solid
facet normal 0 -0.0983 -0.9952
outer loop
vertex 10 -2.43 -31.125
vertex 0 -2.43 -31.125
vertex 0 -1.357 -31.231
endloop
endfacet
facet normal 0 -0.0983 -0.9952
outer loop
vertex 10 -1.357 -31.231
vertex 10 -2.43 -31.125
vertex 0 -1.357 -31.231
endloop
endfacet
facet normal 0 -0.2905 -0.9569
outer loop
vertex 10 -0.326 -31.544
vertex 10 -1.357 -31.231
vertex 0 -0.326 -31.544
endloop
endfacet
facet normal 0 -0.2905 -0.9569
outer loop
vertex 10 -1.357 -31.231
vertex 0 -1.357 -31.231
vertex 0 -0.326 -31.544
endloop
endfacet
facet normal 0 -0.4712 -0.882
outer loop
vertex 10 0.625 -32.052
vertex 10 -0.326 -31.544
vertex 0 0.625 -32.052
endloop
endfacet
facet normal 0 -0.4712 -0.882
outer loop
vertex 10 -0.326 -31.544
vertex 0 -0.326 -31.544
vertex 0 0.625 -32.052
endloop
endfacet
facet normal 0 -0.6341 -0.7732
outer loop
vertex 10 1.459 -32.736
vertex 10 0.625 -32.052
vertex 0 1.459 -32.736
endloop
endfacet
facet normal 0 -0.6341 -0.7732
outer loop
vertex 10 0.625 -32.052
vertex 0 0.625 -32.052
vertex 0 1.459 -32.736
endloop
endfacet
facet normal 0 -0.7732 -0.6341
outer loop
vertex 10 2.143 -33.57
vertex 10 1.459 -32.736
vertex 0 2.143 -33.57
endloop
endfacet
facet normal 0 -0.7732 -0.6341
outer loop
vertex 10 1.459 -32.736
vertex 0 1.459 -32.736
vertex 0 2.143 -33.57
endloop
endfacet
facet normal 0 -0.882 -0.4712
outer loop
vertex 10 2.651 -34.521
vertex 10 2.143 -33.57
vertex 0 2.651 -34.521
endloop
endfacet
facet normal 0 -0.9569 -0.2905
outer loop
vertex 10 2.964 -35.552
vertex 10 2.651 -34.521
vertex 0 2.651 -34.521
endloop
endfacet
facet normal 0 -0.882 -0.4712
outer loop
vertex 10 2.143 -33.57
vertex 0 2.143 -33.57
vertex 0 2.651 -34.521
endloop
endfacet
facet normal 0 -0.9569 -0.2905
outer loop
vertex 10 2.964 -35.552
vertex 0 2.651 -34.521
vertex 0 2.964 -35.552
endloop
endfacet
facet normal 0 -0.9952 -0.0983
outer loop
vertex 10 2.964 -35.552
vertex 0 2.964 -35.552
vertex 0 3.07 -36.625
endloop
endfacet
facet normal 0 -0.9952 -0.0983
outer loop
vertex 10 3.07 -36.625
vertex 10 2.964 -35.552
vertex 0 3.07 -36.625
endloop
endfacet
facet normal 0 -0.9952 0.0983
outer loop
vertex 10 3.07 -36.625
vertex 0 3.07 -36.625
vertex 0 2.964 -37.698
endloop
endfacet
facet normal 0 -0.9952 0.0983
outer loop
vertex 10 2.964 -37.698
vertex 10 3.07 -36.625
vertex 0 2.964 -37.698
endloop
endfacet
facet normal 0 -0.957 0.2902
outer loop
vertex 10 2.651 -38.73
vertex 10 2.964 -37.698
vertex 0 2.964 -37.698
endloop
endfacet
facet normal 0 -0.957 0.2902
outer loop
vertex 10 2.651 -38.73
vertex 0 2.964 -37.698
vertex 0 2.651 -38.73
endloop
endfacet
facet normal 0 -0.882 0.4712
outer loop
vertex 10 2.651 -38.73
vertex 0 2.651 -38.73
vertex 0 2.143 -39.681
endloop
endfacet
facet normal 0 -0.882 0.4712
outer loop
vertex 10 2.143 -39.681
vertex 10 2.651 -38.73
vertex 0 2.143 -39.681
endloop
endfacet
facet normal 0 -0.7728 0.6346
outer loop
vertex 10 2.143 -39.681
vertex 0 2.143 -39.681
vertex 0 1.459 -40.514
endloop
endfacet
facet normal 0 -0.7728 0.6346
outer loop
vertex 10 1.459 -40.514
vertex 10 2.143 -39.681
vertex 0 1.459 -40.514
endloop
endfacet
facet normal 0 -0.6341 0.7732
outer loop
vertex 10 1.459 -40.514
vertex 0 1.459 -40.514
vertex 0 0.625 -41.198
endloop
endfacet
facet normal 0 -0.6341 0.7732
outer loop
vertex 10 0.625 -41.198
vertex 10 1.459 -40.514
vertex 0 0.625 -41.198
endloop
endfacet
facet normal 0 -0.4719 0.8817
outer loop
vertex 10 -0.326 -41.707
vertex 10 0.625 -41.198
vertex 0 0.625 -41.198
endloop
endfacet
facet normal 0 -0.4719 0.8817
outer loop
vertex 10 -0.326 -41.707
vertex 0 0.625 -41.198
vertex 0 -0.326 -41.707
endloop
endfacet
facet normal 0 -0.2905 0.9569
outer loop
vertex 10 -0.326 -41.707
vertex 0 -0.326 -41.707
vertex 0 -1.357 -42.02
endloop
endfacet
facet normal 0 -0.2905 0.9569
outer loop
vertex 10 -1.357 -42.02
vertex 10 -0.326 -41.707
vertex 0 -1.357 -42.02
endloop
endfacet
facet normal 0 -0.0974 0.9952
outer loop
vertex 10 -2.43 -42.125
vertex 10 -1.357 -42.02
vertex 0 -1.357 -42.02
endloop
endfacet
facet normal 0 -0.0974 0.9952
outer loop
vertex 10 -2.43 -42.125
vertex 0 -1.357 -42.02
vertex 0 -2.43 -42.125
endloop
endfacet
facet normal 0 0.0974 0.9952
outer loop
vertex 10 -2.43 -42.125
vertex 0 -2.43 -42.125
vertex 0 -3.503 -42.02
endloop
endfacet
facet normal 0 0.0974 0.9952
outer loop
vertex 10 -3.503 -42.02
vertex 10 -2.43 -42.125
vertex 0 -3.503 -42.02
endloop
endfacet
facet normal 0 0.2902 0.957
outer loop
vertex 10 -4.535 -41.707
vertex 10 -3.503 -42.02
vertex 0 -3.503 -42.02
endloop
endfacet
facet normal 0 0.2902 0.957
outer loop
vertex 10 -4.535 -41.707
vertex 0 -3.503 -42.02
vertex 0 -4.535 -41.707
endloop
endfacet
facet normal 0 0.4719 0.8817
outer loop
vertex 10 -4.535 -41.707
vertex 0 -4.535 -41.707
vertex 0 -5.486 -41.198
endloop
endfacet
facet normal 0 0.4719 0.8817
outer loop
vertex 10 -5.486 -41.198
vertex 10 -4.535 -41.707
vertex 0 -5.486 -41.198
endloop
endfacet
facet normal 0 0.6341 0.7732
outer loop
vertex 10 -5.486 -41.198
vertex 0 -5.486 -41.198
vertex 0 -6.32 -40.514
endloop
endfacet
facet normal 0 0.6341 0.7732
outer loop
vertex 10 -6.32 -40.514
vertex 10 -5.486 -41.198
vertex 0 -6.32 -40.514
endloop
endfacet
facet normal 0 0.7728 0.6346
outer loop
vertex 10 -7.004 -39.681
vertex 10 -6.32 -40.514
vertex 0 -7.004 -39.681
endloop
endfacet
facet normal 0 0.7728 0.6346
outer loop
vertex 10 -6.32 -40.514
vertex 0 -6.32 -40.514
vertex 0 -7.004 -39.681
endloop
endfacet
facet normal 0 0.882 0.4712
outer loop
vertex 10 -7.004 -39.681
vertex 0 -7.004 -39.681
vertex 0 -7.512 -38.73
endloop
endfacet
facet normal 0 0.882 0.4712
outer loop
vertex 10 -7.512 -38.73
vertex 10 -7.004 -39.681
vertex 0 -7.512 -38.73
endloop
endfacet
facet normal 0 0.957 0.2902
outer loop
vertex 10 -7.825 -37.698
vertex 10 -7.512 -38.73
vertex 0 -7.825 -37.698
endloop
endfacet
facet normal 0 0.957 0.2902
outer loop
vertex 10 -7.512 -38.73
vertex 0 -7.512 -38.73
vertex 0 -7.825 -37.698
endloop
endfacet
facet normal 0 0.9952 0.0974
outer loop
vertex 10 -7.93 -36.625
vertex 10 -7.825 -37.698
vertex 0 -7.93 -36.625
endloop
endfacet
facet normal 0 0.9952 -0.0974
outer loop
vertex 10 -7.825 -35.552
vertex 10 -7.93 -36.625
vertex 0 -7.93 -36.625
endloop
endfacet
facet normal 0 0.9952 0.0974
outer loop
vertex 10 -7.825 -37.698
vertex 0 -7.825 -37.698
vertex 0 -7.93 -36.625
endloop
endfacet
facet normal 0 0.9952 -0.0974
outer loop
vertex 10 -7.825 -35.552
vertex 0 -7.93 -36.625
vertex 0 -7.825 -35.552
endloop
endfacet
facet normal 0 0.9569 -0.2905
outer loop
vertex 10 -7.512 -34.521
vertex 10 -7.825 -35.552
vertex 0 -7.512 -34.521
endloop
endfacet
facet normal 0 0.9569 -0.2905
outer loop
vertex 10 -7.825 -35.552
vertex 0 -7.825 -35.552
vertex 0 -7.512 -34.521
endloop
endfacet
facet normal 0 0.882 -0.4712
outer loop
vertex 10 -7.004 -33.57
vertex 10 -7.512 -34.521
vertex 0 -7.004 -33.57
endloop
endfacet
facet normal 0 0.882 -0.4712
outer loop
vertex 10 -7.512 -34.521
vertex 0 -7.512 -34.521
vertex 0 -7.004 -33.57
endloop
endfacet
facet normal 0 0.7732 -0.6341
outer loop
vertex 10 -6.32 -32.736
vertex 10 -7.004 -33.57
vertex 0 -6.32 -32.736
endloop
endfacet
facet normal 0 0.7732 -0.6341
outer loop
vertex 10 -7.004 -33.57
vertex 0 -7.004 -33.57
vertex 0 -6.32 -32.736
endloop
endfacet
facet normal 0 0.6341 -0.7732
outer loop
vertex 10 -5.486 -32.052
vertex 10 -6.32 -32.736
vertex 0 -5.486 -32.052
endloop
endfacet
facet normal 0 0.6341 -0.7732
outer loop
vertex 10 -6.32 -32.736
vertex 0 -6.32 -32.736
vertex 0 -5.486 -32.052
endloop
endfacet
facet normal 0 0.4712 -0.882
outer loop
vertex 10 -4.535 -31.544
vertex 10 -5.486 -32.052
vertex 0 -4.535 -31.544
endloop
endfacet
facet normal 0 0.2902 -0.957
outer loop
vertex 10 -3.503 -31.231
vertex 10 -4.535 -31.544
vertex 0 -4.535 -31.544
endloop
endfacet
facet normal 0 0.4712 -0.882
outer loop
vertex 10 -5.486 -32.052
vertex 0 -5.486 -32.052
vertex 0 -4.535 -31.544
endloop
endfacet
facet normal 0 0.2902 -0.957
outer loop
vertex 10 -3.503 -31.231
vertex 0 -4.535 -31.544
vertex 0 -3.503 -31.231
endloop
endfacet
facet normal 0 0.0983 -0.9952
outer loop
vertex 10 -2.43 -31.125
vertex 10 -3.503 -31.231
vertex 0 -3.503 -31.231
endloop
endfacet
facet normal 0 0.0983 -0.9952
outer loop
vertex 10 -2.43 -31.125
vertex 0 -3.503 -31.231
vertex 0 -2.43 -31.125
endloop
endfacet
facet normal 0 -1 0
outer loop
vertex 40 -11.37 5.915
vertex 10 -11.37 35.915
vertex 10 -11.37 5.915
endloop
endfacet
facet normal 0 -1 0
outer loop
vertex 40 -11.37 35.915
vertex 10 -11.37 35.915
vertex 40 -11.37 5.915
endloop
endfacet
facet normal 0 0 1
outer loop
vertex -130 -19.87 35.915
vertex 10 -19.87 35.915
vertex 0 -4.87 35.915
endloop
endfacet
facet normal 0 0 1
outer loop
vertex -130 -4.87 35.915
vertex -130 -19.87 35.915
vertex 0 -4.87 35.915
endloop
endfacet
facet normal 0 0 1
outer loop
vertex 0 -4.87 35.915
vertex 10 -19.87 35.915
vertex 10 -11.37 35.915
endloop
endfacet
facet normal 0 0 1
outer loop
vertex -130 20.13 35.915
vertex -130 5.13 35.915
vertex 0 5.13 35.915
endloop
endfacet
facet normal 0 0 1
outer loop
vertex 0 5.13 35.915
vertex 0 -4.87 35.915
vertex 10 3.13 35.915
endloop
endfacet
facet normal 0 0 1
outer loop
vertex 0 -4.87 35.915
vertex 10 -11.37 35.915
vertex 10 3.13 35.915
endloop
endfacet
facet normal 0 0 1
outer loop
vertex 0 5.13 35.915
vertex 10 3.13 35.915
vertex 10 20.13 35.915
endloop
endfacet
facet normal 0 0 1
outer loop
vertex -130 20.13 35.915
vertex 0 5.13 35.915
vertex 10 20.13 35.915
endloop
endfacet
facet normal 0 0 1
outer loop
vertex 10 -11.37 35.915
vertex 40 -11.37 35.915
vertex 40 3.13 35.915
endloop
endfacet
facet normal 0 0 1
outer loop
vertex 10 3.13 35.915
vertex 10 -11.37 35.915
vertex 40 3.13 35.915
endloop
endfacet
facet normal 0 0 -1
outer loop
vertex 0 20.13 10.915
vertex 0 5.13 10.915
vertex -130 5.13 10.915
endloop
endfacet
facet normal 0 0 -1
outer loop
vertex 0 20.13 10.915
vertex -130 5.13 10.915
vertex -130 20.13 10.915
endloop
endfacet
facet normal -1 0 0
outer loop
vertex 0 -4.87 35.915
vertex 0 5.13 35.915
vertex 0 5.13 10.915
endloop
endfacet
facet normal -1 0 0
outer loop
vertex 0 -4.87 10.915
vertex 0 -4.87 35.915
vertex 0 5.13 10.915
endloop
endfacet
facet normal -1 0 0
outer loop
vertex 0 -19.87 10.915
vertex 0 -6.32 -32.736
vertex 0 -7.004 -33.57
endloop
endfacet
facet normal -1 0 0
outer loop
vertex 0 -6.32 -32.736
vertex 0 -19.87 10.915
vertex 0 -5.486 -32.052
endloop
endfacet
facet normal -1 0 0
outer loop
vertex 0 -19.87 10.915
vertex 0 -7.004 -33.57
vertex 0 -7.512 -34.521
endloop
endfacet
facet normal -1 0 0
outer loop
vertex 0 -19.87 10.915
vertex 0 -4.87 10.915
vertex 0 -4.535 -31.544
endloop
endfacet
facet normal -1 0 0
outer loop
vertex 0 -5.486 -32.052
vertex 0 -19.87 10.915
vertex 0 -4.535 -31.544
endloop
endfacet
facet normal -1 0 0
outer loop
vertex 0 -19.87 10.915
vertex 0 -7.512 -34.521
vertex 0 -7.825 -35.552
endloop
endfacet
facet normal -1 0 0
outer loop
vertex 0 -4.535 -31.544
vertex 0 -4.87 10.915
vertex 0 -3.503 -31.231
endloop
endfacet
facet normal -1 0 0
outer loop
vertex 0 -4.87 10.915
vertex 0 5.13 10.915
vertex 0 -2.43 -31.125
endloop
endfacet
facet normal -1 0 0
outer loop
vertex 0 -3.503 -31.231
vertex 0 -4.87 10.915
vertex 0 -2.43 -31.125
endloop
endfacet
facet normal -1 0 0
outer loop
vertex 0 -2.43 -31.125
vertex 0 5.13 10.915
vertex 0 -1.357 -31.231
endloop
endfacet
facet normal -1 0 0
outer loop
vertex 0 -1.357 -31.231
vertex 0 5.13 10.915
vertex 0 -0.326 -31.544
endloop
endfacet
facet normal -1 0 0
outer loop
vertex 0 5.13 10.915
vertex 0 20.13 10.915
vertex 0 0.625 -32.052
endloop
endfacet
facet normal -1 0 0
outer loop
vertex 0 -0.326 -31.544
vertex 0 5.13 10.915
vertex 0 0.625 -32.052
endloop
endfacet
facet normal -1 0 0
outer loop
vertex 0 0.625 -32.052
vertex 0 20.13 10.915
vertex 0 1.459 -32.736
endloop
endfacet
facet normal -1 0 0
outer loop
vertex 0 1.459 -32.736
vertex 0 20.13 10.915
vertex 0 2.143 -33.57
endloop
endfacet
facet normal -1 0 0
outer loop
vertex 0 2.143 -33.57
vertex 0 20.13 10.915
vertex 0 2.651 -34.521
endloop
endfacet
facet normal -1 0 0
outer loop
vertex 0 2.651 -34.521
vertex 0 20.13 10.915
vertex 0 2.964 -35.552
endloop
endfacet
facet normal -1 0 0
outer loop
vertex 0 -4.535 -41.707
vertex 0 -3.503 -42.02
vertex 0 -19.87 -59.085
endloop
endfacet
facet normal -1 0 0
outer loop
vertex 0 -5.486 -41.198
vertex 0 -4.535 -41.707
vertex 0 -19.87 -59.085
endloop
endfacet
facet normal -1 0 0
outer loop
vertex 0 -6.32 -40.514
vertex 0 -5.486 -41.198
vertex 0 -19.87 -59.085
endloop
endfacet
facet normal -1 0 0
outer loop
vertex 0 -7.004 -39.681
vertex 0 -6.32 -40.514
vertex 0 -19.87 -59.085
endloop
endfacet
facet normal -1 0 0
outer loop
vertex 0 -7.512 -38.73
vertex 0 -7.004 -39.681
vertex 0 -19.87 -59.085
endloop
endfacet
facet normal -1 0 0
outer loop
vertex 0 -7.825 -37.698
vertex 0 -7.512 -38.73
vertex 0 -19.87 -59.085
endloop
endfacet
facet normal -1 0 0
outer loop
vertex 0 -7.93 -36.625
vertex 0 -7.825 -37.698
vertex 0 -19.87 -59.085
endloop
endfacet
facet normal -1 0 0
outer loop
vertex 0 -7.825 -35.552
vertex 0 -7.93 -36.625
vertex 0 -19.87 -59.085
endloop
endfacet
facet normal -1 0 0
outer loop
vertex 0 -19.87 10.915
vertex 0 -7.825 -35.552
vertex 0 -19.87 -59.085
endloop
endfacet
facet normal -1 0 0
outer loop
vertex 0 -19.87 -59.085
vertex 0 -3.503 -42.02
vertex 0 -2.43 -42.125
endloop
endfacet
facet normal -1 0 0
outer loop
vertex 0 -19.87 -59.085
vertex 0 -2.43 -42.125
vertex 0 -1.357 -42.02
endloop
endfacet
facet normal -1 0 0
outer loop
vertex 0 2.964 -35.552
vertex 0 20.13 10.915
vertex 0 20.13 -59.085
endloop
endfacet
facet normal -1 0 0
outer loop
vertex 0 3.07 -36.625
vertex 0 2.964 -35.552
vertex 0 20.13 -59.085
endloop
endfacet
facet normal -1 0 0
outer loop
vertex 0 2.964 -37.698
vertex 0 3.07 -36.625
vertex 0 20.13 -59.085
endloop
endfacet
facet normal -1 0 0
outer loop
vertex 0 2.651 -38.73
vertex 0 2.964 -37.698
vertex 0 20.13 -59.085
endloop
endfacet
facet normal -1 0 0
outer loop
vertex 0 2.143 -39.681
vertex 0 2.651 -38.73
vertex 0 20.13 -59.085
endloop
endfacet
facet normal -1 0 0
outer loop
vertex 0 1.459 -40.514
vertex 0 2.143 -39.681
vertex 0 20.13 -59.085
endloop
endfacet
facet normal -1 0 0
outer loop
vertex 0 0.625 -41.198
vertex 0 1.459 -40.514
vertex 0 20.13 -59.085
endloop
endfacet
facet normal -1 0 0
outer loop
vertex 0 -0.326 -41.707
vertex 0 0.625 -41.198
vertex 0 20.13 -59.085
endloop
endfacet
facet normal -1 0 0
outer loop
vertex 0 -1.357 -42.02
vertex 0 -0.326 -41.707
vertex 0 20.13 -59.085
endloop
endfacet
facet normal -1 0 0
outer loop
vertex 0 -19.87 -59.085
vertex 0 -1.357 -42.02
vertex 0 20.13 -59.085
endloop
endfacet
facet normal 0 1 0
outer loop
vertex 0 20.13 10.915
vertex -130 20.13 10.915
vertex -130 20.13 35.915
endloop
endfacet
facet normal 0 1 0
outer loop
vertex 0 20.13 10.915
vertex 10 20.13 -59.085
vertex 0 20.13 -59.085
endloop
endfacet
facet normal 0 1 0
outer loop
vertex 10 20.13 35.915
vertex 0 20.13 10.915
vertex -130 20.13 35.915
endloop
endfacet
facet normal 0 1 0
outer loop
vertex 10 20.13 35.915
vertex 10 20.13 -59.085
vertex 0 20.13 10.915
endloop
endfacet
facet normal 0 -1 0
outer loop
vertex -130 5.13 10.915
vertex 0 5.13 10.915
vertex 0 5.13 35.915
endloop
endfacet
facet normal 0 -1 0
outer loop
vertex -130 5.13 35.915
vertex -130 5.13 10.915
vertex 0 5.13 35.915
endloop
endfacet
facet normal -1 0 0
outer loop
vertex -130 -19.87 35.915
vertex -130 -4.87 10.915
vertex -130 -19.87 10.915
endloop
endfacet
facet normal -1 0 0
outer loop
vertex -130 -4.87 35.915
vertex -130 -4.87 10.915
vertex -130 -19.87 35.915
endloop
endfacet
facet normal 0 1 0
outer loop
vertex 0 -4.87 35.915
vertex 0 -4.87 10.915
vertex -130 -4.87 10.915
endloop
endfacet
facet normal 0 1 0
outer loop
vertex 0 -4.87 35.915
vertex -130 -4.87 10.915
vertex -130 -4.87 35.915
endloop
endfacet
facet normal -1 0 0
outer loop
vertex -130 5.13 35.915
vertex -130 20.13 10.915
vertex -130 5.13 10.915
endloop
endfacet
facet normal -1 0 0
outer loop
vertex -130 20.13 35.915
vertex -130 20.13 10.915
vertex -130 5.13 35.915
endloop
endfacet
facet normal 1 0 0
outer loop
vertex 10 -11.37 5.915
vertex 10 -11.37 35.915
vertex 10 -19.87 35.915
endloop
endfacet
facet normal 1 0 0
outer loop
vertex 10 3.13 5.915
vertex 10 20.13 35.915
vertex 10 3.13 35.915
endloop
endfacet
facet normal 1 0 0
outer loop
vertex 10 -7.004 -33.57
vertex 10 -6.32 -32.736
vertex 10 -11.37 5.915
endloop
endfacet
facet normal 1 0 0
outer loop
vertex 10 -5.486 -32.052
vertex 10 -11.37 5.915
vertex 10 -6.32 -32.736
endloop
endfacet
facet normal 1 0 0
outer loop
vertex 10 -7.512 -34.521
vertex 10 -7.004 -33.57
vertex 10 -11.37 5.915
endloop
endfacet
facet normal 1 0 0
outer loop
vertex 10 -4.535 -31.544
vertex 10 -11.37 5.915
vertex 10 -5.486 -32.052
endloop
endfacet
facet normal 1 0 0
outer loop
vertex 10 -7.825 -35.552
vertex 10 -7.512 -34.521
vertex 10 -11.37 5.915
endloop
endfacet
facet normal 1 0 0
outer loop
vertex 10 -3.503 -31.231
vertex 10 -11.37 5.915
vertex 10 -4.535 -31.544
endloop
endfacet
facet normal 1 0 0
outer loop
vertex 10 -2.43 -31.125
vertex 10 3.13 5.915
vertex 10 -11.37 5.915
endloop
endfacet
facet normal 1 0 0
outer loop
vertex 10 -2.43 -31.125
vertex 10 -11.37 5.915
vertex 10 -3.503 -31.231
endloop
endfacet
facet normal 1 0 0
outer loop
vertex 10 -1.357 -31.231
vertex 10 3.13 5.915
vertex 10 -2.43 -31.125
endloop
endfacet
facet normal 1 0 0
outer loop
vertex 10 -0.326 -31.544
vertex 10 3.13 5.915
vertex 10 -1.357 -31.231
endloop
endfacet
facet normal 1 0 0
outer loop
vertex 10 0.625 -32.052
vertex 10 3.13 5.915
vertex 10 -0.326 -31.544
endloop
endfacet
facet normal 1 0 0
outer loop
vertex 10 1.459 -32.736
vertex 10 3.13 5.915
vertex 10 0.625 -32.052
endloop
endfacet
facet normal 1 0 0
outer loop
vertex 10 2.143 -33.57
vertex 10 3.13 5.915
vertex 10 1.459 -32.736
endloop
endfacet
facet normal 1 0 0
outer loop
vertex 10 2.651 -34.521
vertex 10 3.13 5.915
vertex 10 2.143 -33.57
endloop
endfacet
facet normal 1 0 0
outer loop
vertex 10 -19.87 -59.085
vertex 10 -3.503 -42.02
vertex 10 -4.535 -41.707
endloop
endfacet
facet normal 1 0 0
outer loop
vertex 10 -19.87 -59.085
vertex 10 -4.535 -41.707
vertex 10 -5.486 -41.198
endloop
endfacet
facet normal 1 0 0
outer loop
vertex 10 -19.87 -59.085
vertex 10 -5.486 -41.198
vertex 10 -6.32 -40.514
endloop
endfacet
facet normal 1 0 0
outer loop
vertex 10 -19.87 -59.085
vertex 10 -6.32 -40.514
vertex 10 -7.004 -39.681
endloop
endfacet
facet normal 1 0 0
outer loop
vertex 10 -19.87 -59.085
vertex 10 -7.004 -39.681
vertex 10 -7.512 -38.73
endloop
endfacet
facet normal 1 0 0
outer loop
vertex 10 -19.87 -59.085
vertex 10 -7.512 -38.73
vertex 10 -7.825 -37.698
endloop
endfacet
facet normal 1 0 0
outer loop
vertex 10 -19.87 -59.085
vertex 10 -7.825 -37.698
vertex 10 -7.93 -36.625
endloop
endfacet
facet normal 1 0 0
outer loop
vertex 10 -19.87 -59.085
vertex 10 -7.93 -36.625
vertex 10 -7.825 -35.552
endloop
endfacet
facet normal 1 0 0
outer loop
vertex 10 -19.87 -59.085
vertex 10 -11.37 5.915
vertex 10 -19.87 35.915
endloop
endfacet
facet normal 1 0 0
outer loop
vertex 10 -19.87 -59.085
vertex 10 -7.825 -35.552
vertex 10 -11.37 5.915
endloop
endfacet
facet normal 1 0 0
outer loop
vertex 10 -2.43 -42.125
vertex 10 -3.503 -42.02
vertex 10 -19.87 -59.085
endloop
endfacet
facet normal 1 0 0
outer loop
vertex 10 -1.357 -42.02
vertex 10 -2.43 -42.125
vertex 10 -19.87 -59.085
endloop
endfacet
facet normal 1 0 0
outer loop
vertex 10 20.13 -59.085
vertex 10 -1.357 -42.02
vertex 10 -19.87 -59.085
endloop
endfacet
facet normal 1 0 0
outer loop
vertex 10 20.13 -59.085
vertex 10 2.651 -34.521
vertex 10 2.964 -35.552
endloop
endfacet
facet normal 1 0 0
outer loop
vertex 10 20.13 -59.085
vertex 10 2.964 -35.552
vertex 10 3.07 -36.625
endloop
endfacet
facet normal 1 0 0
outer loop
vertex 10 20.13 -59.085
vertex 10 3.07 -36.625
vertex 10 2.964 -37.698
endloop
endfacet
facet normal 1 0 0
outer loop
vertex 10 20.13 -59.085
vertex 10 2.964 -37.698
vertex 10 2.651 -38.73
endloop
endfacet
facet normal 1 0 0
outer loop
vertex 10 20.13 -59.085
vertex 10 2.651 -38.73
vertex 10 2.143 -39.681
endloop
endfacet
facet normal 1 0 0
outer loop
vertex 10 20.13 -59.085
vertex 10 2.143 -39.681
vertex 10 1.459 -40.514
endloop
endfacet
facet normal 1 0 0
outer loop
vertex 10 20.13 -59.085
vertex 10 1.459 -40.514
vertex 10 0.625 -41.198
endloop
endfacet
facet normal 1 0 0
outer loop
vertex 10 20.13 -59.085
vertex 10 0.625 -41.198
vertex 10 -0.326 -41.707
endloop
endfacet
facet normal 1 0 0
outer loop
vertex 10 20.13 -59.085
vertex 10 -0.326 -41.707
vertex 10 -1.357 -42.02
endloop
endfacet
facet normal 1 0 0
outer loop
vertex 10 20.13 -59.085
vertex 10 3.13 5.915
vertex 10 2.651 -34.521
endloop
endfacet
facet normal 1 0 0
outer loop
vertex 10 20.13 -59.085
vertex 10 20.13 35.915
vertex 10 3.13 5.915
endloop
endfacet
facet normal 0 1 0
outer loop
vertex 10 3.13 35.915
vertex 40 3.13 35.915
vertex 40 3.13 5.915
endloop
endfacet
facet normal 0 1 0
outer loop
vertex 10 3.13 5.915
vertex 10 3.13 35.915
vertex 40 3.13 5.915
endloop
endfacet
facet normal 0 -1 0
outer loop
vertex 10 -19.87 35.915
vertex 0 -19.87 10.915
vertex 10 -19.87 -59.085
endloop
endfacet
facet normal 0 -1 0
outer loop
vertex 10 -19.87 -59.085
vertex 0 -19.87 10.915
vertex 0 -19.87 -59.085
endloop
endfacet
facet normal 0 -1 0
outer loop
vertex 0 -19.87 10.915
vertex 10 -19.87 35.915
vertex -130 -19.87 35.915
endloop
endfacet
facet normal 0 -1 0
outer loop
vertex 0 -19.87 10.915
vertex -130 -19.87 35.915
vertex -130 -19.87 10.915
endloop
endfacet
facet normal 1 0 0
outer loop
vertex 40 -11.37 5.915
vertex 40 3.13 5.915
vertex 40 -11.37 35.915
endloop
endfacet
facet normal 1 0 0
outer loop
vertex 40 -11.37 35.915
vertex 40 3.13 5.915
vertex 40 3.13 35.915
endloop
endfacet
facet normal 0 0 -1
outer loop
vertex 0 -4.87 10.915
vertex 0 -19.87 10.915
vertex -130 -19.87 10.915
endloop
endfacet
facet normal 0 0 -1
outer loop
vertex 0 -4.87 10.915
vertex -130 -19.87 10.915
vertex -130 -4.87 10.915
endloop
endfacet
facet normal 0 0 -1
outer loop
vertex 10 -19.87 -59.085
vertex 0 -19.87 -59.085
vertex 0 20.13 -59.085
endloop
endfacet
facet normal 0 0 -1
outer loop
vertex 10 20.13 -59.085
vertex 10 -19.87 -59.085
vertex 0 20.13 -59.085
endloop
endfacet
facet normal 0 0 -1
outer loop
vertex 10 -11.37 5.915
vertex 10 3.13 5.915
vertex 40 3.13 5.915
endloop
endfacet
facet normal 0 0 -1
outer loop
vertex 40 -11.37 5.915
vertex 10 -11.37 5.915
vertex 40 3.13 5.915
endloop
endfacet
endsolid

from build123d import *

# Parameters (mm, degrees)
SKETCH1_W           = 95
SKETCH1_H           = 40
BOSS_EXTRUDE1_DEPTH = 10
SKETCH4_W           = 25
SKETCH4_H           = 15
BOSS_EXTRUDE4_DEPTH = 130
SKETCH5_R           = 5.5
CUT_EXTRUDE1_DEPTH  = 27
SKETCH6_W           = 30
SKETCH6_H           = 6
BOSS_EXTRUDE5_DEPTH = 30
SKETCH7_W           = 30
SKETCH7_H           = 30
BOSS_EXTRUDE6_DEPTH = 8.5


with BuildPart() as part:
    # Sketch1 → Boss-Extrude1 (new body)
    with BuildSketch(Plane(origin=(0, 0, 0), x_dir=(0, 0, -1), z_dir=(1, 0, 0))):
        with Locations((11.585365854, 0.129573171)):
            Rectangle(SKETCH1_W, SKETCH1_H)
    extrude(amount=BOSS_EXTRUDE1_DEPTH)

    # Sketch4 → Boss-Extrude4 (add)
    with BuildSketch(Plane.ZY):
        with Locations((23.414634146, 12.629573171)):
            Rectangle(SKETCH4_W, SKETCH4_H)
        with Locations((23.414634146, -12.370426829)):
            Rectangle(SKETCH4_W, SKETCH4_H)
    extrude(amount=BOSS_EXTRUDE4_DEPTH)

    # Sketch5 → Cut-Extrude1 (cut)
    with BuildSketch(Plane.ZY):
        with Locations((-36.625365854, -2.430426829)):
            Circle(SKETCH5_R)
    extrude(amount=-CUT_EXTRUDE1_DEPTH, mode=Mode.SUBTRACT)

    # Sketch6 → Boss-Extrude5 (add)
    with BuildSketch(Plane(origin=(10, 0, 0), x_dir=(0, 0, -1), z_dir=(1, 0, 0))):
        with Locations((-20.914634146, 0.129573171)):
            Rectangle(SKETCH6_W, SKETCH6_H)
    extrude(amount=BOSS_EXTRUDE5_DEPTH)

    # Sketch7 → Boss-Extrude6 (add)
    with BuildSketch(Plane.XZ.offset(2.870426829)):
        with Locations((25, 20.914634146)):
            Rectangle(SKETCH7_W, SKETCH7_H)
    extrude(amount=BOSS_EXTRUDE6_DEPTH)


solid = part.part
